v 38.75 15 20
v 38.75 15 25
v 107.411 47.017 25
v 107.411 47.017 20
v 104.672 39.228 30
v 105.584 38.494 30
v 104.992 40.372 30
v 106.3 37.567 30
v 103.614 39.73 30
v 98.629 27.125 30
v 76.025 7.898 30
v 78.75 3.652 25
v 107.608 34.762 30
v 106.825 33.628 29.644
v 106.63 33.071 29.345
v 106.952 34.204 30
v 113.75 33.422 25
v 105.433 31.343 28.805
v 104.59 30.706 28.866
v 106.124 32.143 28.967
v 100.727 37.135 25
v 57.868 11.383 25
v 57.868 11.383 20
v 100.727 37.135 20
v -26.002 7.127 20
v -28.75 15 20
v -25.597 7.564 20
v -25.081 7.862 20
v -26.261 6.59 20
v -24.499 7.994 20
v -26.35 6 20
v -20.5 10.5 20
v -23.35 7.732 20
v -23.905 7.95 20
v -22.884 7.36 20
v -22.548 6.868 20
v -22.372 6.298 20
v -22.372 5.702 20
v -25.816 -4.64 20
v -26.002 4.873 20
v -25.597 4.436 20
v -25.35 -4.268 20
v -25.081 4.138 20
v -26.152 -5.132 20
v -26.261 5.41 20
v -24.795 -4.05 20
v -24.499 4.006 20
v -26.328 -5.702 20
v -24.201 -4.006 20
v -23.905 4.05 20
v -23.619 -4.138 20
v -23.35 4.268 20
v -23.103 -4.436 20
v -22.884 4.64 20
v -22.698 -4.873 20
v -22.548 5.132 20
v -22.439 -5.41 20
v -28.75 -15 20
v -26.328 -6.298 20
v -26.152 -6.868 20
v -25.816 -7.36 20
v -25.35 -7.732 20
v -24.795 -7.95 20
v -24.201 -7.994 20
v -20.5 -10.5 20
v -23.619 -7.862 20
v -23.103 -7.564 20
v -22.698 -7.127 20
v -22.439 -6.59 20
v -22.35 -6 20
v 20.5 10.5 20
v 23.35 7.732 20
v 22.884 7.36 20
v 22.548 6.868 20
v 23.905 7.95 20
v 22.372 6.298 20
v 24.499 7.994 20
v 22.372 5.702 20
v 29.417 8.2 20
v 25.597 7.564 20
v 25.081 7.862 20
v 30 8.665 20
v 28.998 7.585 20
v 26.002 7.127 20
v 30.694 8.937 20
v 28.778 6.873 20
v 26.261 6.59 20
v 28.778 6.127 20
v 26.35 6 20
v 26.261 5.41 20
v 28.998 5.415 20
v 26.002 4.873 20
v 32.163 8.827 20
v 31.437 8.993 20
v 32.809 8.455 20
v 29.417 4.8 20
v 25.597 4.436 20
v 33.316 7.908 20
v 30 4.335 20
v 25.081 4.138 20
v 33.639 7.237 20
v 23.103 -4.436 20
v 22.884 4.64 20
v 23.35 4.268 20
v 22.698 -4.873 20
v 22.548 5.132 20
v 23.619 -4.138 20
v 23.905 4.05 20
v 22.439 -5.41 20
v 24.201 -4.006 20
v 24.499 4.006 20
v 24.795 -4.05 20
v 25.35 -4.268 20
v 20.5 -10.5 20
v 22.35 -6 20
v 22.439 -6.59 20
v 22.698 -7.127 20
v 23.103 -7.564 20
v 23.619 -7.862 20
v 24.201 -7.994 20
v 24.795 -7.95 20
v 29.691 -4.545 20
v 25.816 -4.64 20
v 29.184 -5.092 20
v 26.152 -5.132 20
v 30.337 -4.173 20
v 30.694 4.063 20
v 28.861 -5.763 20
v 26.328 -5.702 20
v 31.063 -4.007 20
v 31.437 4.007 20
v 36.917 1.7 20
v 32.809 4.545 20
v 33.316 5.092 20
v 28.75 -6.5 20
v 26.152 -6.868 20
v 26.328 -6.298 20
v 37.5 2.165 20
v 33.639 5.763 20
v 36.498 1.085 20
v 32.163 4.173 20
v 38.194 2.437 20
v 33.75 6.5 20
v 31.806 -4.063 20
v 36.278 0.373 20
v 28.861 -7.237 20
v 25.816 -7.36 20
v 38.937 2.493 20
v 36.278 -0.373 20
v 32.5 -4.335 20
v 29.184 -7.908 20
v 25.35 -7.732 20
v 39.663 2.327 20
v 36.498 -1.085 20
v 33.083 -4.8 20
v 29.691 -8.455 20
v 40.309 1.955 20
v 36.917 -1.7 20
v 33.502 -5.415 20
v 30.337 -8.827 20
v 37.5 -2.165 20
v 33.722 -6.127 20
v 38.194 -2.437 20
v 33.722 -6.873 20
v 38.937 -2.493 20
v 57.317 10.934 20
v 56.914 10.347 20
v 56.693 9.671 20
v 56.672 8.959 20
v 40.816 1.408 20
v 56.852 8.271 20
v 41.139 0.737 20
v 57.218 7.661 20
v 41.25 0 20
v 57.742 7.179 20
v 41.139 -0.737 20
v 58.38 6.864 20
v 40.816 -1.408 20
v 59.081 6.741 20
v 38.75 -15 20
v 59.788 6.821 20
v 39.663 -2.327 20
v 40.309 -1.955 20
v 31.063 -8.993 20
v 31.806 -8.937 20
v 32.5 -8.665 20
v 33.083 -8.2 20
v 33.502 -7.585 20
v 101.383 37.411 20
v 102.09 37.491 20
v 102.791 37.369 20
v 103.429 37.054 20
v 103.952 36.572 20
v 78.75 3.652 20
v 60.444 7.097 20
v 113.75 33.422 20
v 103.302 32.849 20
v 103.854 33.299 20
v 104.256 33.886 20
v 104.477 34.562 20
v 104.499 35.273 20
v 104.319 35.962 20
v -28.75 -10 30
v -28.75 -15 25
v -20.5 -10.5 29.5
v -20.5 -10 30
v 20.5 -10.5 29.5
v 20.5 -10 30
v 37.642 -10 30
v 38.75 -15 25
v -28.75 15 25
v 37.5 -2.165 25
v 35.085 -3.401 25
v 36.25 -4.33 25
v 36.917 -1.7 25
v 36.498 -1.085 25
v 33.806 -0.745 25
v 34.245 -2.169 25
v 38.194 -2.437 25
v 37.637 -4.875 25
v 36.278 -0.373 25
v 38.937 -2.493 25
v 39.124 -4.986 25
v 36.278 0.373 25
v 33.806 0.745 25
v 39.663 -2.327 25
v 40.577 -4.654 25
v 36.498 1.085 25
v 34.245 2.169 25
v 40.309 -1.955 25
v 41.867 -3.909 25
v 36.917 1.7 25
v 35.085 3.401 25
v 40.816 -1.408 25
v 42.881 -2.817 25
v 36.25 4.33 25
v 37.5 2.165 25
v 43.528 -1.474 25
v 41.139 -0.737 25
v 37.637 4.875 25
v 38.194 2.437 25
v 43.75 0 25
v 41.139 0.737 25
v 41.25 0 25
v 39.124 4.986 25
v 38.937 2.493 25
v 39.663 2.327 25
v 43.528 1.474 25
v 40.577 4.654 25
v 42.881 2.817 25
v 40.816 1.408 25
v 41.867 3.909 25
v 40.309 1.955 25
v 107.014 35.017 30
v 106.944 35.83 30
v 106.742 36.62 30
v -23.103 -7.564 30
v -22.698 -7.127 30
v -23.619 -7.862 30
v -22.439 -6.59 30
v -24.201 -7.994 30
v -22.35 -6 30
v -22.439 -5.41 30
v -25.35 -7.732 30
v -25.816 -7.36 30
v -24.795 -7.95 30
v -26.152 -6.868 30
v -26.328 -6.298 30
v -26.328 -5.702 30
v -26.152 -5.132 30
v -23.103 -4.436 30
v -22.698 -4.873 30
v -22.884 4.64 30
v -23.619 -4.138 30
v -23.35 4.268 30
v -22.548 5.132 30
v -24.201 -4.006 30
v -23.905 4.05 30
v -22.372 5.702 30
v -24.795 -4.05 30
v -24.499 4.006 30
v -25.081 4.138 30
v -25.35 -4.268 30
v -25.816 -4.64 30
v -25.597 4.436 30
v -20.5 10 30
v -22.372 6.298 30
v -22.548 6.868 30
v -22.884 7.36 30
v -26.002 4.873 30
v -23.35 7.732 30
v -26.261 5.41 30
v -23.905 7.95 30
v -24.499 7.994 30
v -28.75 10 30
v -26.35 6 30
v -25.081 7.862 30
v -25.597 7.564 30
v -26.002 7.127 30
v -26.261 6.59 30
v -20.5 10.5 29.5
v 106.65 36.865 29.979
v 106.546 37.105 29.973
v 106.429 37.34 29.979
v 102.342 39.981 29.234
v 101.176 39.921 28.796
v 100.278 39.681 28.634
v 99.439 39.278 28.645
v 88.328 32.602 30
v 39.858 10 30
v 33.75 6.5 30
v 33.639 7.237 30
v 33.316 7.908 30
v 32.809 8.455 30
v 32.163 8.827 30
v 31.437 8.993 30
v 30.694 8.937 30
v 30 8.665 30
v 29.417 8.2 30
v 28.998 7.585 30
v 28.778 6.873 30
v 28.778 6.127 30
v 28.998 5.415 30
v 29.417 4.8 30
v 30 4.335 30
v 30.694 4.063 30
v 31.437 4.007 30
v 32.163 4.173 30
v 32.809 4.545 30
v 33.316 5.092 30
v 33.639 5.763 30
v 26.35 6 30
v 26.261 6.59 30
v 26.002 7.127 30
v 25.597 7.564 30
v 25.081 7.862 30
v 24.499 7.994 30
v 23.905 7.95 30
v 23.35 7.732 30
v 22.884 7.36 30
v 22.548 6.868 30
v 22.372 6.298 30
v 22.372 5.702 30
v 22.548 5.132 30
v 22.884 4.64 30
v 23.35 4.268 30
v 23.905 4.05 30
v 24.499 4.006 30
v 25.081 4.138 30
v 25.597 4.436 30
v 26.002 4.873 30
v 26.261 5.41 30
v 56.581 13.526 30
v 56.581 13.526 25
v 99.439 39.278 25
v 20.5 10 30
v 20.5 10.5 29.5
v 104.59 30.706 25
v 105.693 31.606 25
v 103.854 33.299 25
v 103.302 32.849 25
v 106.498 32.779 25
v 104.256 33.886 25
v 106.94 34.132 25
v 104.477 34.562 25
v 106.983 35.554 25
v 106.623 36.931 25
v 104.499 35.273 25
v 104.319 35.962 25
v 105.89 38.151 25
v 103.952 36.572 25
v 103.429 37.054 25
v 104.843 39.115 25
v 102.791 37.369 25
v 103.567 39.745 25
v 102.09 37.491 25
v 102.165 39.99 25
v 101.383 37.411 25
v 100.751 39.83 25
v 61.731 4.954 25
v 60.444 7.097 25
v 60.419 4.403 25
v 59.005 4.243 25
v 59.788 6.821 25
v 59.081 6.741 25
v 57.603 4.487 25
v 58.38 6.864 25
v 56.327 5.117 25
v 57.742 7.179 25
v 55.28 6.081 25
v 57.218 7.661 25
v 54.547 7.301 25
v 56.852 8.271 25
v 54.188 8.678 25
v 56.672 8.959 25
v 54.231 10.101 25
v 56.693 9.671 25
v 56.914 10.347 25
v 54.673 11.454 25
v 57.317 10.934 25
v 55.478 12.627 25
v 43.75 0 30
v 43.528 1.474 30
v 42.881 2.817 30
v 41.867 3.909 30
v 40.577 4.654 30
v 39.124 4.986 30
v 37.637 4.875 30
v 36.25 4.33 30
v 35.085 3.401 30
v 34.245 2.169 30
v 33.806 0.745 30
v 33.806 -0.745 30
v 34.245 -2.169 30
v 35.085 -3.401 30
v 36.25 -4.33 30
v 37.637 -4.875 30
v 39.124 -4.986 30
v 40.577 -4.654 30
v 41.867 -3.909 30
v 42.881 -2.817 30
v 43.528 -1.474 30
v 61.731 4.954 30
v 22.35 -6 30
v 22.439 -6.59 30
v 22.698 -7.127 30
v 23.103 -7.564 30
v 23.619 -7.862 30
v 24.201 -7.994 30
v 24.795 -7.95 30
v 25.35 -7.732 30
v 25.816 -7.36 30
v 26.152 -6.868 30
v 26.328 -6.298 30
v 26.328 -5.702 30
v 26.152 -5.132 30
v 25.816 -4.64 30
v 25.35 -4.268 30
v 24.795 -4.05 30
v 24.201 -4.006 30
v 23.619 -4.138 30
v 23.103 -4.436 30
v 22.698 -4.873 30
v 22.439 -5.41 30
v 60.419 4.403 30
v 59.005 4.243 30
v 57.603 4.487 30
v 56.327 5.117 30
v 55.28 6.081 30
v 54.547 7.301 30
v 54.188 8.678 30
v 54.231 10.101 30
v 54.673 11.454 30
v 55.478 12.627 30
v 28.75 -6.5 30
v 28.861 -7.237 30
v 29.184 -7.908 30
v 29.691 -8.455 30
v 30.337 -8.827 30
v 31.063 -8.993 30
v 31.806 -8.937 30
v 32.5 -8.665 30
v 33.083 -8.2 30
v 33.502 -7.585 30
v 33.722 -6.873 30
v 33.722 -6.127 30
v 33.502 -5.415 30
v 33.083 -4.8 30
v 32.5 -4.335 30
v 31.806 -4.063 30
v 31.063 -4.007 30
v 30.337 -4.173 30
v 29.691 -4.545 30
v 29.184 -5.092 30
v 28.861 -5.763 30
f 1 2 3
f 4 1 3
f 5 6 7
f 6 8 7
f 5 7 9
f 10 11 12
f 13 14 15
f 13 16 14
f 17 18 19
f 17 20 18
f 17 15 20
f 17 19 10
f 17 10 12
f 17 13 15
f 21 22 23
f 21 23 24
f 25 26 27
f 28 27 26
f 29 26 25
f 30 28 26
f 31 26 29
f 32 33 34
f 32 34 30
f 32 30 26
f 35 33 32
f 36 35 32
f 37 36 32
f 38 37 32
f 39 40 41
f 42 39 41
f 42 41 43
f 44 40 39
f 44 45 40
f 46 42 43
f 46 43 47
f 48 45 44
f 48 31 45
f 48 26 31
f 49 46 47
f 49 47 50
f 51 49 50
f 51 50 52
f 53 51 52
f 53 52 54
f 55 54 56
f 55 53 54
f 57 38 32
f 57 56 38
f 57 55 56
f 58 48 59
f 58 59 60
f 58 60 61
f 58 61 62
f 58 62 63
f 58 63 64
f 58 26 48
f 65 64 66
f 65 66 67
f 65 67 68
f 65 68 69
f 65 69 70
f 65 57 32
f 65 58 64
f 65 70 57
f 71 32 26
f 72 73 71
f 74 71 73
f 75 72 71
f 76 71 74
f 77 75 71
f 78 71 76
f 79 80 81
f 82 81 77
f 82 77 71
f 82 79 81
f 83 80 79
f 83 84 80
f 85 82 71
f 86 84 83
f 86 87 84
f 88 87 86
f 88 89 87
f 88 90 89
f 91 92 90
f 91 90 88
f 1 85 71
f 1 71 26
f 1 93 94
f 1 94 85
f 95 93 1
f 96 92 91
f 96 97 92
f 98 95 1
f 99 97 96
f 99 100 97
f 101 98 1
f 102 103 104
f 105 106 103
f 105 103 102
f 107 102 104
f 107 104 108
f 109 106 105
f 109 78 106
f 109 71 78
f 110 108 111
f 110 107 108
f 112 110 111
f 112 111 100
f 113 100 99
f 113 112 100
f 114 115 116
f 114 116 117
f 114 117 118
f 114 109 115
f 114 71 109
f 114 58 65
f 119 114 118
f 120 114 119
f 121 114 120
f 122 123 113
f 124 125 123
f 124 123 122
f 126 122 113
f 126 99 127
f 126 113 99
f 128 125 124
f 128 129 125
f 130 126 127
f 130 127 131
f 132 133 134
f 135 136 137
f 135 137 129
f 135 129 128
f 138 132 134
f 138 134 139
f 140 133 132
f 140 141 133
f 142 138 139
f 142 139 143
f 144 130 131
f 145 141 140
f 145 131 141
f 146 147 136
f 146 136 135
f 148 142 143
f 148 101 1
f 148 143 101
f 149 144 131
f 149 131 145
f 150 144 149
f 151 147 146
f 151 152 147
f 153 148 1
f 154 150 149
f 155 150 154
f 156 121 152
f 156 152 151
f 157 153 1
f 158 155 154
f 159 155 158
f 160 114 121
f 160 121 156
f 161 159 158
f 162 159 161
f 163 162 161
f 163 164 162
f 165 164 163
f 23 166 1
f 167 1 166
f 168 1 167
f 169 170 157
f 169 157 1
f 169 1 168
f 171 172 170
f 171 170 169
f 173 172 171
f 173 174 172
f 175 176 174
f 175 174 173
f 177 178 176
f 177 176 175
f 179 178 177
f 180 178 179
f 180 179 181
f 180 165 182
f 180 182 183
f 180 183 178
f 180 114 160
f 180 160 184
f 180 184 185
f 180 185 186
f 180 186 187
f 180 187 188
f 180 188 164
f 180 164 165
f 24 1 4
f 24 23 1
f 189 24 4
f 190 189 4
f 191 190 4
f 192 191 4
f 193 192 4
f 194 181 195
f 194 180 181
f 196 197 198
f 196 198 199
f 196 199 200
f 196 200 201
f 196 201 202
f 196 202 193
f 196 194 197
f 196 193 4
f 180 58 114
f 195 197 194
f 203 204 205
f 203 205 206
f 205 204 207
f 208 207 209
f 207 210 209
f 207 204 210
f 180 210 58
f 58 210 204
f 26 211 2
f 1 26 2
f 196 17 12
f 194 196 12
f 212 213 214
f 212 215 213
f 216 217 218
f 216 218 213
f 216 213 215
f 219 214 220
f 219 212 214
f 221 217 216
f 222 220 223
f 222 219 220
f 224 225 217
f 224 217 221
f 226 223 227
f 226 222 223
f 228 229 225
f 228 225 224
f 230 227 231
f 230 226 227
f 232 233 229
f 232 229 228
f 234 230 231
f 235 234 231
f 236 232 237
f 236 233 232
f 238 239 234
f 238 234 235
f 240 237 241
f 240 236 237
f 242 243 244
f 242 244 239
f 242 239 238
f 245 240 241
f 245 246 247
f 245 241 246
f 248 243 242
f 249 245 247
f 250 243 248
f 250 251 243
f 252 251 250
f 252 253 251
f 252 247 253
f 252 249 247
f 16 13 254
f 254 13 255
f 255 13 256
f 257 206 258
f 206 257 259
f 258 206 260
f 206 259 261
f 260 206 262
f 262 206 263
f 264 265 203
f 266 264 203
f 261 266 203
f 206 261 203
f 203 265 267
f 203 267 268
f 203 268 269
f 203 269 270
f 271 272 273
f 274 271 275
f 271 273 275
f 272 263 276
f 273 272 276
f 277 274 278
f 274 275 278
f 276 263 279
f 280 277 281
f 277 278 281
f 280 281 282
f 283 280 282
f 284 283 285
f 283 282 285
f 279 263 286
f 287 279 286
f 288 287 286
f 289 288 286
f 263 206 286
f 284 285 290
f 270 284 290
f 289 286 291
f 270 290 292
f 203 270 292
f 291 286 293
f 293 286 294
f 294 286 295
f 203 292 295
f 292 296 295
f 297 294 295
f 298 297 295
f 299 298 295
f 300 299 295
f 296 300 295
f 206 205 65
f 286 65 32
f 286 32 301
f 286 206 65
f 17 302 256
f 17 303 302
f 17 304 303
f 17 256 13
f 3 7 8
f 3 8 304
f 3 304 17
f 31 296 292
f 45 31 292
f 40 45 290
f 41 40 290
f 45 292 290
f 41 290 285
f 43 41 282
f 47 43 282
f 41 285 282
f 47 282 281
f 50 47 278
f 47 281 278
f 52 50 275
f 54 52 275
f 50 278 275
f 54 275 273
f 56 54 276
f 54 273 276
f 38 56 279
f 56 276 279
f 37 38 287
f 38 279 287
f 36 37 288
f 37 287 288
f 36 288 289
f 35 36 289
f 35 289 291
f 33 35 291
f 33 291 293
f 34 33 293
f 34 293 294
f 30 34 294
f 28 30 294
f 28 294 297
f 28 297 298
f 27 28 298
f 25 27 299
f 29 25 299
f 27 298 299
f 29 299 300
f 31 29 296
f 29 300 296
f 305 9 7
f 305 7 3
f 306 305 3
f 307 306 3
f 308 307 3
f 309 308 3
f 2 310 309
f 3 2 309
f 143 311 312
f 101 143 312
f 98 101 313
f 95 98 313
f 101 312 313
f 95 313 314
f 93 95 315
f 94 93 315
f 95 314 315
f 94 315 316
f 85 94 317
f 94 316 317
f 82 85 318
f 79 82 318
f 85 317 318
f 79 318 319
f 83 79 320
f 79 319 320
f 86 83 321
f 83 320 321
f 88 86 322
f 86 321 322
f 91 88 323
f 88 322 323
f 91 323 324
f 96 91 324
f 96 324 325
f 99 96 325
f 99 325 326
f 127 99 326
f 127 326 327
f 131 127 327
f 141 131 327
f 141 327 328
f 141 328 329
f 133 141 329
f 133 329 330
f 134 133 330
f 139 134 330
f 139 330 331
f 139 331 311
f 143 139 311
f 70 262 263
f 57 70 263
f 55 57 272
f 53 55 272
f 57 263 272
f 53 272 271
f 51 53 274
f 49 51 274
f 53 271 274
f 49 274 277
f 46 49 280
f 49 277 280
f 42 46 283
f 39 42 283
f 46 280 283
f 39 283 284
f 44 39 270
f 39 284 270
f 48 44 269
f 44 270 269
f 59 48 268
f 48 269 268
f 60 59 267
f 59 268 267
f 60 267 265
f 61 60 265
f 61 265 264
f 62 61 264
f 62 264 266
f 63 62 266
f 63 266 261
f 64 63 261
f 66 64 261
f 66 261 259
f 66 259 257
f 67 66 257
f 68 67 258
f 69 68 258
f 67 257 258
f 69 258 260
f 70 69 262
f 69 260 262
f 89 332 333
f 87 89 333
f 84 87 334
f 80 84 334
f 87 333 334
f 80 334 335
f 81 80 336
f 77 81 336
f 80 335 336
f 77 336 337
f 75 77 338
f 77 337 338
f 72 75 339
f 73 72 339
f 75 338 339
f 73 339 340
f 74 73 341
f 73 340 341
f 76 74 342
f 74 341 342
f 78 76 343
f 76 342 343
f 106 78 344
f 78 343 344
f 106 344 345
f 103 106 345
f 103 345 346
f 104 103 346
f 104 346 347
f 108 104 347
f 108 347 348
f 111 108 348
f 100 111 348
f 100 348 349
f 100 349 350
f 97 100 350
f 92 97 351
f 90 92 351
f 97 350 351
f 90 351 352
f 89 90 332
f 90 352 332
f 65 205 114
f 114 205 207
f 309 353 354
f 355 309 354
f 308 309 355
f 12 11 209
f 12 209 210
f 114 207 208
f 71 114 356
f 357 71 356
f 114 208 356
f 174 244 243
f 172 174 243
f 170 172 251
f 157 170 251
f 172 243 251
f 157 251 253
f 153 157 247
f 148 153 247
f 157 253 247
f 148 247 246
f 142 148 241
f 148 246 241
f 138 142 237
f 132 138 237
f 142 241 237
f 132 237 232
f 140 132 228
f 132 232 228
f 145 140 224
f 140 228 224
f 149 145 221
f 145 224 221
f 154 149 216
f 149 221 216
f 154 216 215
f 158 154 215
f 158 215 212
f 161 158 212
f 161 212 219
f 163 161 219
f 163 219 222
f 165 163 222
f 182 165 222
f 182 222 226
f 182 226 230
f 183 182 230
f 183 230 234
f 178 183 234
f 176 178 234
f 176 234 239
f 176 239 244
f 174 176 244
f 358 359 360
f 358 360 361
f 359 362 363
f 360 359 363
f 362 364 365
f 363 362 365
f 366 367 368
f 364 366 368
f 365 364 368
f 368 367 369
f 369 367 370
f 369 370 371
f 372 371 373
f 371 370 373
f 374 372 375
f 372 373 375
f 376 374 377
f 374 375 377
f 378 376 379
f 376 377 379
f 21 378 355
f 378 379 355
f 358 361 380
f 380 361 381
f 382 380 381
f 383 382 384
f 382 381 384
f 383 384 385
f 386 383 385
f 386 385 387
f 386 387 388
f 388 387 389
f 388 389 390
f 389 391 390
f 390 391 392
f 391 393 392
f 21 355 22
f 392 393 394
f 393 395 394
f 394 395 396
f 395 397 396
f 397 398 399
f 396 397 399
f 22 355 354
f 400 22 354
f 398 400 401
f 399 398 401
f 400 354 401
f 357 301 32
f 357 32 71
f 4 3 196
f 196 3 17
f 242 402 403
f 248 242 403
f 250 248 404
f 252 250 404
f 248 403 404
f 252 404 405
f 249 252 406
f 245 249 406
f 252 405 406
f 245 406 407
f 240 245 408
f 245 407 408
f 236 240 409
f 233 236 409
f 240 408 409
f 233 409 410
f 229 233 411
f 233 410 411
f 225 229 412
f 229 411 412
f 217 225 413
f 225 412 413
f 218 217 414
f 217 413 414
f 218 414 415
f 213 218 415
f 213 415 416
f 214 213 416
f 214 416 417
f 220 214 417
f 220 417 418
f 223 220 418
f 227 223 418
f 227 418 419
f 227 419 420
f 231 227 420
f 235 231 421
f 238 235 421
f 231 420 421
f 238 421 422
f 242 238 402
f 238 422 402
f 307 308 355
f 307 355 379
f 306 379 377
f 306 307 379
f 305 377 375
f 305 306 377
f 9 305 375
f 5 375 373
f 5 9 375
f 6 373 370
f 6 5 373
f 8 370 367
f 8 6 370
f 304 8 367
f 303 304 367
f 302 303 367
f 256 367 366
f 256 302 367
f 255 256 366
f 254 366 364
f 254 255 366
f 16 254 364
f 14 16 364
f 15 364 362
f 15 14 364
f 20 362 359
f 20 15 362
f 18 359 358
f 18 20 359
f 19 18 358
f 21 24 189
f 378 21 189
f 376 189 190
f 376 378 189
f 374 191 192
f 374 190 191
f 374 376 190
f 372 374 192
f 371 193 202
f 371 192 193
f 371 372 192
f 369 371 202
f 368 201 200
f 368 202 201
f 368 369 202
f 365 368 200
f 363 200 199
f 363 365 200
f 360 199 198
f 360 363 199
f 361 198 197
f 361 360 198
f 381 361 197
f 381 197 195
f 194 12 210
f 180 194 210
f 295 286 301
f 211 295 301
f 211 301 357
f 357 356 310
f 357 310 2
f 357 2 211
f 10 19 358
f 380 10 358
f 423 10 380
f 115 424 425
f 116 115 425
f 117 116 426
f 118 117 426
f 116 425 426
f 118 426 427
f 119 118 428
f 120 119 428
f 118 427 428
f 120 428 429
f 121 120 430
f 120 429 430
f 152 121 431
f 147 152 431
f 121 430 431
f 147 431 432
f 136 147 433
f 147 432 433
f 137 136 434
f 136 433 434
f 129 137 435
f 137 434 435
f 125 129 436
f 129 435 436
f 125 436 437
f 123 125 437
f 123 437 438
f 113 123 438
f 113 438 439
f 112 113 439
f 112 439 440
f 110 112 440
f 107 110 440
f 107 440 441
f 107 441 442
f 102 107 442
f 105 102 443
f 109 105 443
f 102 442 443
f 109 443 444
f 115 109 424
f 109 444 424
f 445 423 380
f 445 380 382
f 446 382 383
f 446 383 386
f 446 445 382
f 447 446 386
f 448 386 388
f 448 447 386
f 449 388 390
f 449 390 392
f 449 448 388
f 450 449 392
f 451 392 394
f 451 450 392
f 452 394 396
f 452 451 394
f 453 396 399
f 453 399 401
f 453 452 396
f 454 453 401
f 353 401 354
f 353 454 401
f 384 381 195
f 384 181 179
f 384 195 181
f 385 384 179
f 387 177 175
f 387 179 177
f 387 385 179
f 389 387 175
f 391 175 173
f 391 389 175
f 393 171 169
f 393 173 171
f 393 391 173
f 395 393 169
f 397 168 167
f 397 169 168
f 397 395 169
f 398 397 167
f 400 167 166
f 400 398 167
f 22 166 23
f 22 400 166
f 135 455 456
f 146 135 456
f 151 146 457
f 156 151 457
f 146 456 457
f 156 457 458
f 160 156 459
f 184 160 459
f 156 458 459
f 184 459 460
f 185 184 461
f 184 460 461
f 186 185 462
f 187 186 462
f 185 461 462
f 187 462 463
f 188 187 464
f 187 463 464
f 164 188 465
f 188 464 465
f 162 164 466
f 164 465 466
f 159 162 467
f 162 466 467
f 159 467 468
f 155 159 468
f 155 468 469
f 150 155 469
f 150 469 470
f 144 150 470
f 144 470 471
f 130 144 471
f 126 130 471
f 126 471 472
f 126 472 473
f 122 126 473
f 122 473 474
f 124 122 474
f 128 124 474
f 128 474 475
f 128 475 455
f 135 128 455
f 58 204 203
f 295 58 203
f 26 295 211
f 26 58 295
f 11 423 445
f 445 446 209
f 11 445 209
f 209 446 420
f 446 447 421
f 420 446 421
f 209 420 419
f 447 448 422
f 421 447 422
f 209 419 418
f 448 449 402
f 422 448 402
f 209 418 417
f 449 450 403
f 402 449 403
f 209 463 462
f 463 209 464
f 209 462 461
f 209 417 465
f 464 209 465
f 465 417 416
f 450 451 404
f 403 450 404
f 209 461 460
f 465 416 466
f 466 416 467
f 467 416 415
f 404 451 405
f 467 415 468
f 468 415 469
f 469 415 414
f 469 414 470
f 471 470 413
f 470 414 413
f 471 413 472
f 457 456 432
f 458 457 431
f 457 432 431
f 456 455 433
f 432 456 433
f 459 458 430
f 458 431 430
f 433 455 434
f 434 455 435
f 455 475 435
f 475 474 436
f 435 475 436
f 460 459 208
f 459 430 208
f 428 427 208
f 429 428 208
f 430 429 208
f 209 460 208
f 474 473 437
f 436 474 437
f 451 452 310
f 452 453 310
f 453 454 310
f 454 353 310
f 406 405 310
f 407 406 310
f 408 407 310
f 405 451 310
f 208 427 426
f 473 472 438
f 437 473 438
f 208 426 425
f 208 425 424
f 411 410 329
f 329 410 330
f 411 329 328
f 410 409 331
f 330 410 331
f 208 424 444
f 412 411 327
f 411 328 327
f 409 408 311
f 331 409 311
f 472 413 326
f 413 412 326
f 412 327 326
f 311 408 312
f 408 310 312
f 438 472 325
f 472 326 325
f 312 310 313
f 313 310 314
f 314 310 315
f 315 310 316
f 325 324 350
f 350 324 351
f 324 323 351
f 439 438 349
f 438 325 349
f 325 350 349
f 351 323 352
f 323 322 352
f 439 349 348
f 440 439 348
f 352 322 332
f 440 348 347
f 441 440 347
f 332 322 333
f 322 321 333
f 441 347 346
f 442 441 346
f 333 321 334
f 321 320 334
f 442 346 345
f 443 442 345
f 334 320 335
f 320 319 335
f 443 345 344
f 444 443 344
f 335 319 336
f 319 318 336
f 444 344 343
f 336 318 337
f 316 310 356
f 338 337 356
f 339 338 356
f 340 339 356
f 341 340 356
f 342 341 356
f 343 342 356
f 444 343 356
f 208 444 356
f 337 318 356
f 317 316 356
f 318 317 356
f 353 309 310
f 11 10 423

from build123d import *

# Parameters (mm, degrees)
SKETCH1_W                = 57.5
SKETCH1_H                = 30
BOSS_EXTRUDE1_DEPTH      = 30
SKETCH2_W                = 41
SKETCH2_H                = 21
CUT_EXTRUDE1_DEPTH       = 25
SKETCH8_R                = 2
CUT_EXTRUDE6_DEPTH       = 10
SKETCH10_R               = 5
CUT_EXTRUDE8_DEPTH       = 10
BOSS_EXTRUDE4_DEPTH      = 30
SKETCH16_R               = 5
CUT_EXTRUDE10_DEPTH      = 30
CHAMFER5_SIZE            = 5
SKETCH19_R               = 2.5
CUT_EXTRUDE12_DEPTH      = 30
SKETCH20_R               = 7.5
CUT_EXTRUDE13_DEPTH      = 2.5
CUT_EXTRUDE15_DEPTH      = 122.918629513
CUT_EXTRUDE15_DEPTH_BACK = 122.918629513
SKETCH29_W               = 67.5
SKETCH29_H               = 15
CUT_EXTRUDE16_DEPTH      = 124.489525441
CUT_EXTRUDE17_DEPTH      = 5
SKETCH32_R               = 5
CUT_EXTRUDE18_DEPTH      = 5


with BuildPart() as part:
    # Sketch1 → Boss-Extrude1 (new body)
    with BuildSketch(Plane.XY):
        Rectangle(SKETCH1_W, SKETCH1_H)
    extrude(amount=BOSS_EXTRUDE1_DEPTH)

    # Sketch2 → Cut-Extrude1 (cut)
    with BuildSketch(Plane.XY.offset(30)):
        Rectangle(SKETCH2_W, SKETCH2_H)
    extrude(amount=-CUT_EXTRUDE1_DEPTH, mode=Mode.SUBTRACT)

    # Sketch8 → Cut-Extrude6 (cut)
    with BuildSketch(Plane.XY.offset(30)):
        with Locations((24.35, 6)):
            Circle(SKETCH8_R)
        with Locations(Location((24.35, -6, 0), (0, 0, 180))):
            Circle(SKETCH8_R)
        with Locations((-24.35, -6)):
            Circle(SKETCH8_R)
        with Locations(Location((-24.35, 6, 0), (0, 0, 180))):
            Circle(SKETCH8_R)
    extrude(amount=-CUT_EXTRUDE6_DEPTH, mode=Mode.SUBTRACT)

    # Sketch10 → Cut-Extrude8 (cut)
    with BuildSketch(Plane.XY.offset(5)):
        with Locations((-10, 0)):
            Circle(SKETCH10_R)
    extrude(amount=-CUT_EXTRUDE8_DEPTH, mode=Mode.SUBTRACT)

    # Sketch13 → Boss-Extrude4 (add)
    with BuildSketch(Plane.XY.offset(30)):
        Polygon((28.75, 15), (38.75, 15), (107.410726074, 47.017022383), (113.75, 33.422405577), (78.75, 3.652306326), (38.75, -15), (28.75, -15), align=None)
    extrude(amount=-BOSS_EXTRUDE4_DEPTH)

    # Sketch16 → Cut-Extrude10 (cut)
    with BuildSketch(Plane(origin=(1.175656739, -2.521204013, 0), x_dir=(0.9063077870366488, 0.42261826174070183, 0), z_dir=(-0.42261826174070183, 0.9063077870366488, 0))):
        with Locations(Location((97.217429724, -15, 0), (0, 0, 180))):
            Circle(SKETCH16_R)
        with BuildLine():
            Line((67.217429724, -12.5), (82.217429724, -12.5))
            ThreePointArc((82.217429724, -12.5), (84.717429724, -15), (82.217429724, -17.5))
            Line((82.217429724, -17.5), (67.217429724, -17.5))
            ThreePointArc((67.217429724, -17.5), (64.717429724, -15), (67.217429724, -12.5))
        make_face()
    extrude(amount=-CUT_EXTRUDE10_DEPTH, mode=Mode.SUBTRACT)

    # Chamfer5
    # the kernel refuses this chamfer: 5 mm, written as the material it takes off along each edge
    with BuildSketch(Plane(origin=(-28.75, 27.85841494, 0), x_dir=(-0.027495876610586317, 0, 0.9996219169112968), z_dir=(0, -1, 0))) as chamfer5_piece_1:
        Polygon((CHAMFER5_SIZE * 0.999621916911, -CHAMFER5_SIZE * 0.0274958766106), (-CHAMFER5_SIZE * 0.0274958766106, -CHAMFER5_SIZE * 0.999621916911), (0, 0), align=None)
    extrude(amount=55.71682988, mode=Mode.SUBTRACT)
    with BuildSketch(Plane(origin=(-41.60841494, -15, 0), x_dir=(0, -0.027495876610586317, 0.9996219169112968), z_dir=(1, 0, 0)), Plane(origin=(51.60841494, -15, 30), x_dir=(0, -0.027495876610586317, -0.9996219169112968), z_dir=(-1, 0, 0))) as chamfer5_piece_2:
        Polygon((CHAMFER5_SIZE * 0.999621916911, -CHAMFER5_SIZE * 0.0274958766106), (-CHAMFER5_SIZE * 0.0274958766106, -CHAMFER5_SIZE * 0.999621916911), (0, 0), align=None)
    extrude(amount=93.21682988, mode=Mode.SUBTRACT)
    with BuildSketch(Plane(origin=(90.403681589, 9.086507297, 0), x_dir=(0.011620259578202724, -0.024919727083573626, 0.9996219169112968), z_dir=(-0.9063077870366526, -0.4226182617406939, 0)), Plane(origin=(90.403681589, 9.086507297, 30), x_dir=(-0.4224584769229526, 0.905965127389214, 0.02749587661058631), z_dir=(-0.9063077870366526, -0.4226182617406939, 0))) as chamfer5_piece_3:
        Polygon((CHAMFER5_SIZE * 0.999621916911, CHAMFER5_SIZE * 0.0274958766106), (-CHAMFER5_SIZE * 0.0274958766106, CHAMFER5_SIZE * 0.999621916911), (0, 0), align=None)
    extrude(amount=69.851946638, mode=Mode.SUBTRACT)
    with BuildSketch(Plane(origin=(123.544555766, 41.753402643, 0), x_dir=(-0.6476573741944397, 0.7614354223576539, -0.027495876610586414), z_dir=(-0.7617234170999287, -0.6479023351104763, 0))) as chamfer5_piece_4:
        Polygon((CHAMFER5_SIZE * 0.999621916911, -CHAMFER5_SIZE * 0.0274958766106), (-CHAMFER5_SIZE * 0.0274958766106, -CHAMFER5_SIZE * 0.999621916911), (0, 0), align=None)
    extrude(amount=71.665266299, mode=Mode.SUBTRACT)
    with BuildSketch(Plane(origin=(101.976525103, 58.670703972, 0), x_dir=(-0.9059651273892108, -0.42245847692295924, -0.027495876610586344), z_dir=(0.42261826174070055, -0.9063077870366495, 0))) as chamfer5_piece_5:
        Polygon((CHAMFER5_SIZE * 0.999621916911, -CHAMFER5_SIZE * 0.0274958766106), (-CHAMFER5_SIZE * 0.0274958766106, -CHAMFER5_SIZE * 0.999621916911), (0, 0), align=None)
    extrude(amount=40.71682988, mode=Mode.SUBTRACT)
    with BuildSketch(Plane(origin=(27.096318411, 9.565799029, 0), x_dir=(0.4224584769229604, -0.9059651273892103, -0.02749587661058636), z_dir=(0.9063077870366489, 0.4226182617407018, 0))) as chamfer5_piece_6_section:
        Polygon((CHAMFER5_SIZE * 0.999621916911, -CHAMFER5_SIZE * 0.0274958766106), (-CHAMFER5_SIZE * 0.0274958766106, -CHAMFER5_SIZE * 0.999621916911), (0, 0), align=None)
    chamfer5_piece_6 = extrude(amount=101.47555893, mode=Mode.PRIVATE)
    chamfer5_piece_6 = split(chamfer5_piece_6, bisect_by=Plane(origin=(81.150743587, 15, 1.670360501), z_dir=(0, 1, 0)), keep=Keep.TOP, mode=Mode.PRIVATE)
    add(chamfer5_piece_6, mode=Mode.SUBTRACT)
    with BuildSketch(Plane(origin=(-41.60841494, 15, 0), x_dir=(0, -0.9996219169112968, -0.027495876610586372), z_dir=(1, 0, 0))) as chamfer5_piece_7_section:
        Polygon((CHAMFER5_SIZE * 0.999621916911, -CHAMFER5_SIZE * 0.0274958766106), (-CHAMFER5_SIZE * 0.0274958766106, -CHAMFER5_SIZE * 0.999621916911), (0, 0), align=None)
    chamfer5_piece_7 = extrude(amount=93.21682988, mode=Mode.PRIVATE)
    chamfer5_piece_7 = split(chamfer5_piece_7, bisect_by=Plane(origin=(3.719146846, -1.335155097, 1.672660276), z_dir=(-0.4226182617407018, 0.9063077870366489, 0)), keep=Keep.TOP, mode=Mode.PRIVATE)
    add(chamfer5_piece_7, mode=Mode.SUBTRACT)
    with BuildSketch(Plane(origin=(51.60841494, 15, 30), x_dir=(0, -0.9996219169112968, 0.027495876610586317), z_dir=(-1, 0, 0))) as chamfer5_piece_8_section:
        Polygon((CHAMFER5_SIZE * 0.999621916911, -CHAMFER5_SIZE * 0.0274958766106), (-CHAMFER5_SIZE * 0.0274958766106, -CHAMFER5_SIZE * 0.999621916911), (0, 0), align=None)
    chamfer5_piece_8 = extrude(amount=93.21682988, mode=Mode.PRIVATE)
    chamfer5_piece_8 = split(chamfer5_piece_8, bisect_by=Plane(origin=(3.719146846, -1.335155097, 28.327339724), z_dir=(-0.4226182617407018, 0.9063077870366489, 0)), keep=Keep.TOP, mode=Mode.PRIVATE)
    add(chamfer5_piece_8, mode=Mode.SUBTRACT)
    with BuildSketch(Plane(origin=(123.544555766, 41.753402643, 30), x_dir=(-0.6476573741944397, 0.7614354223576539, 0.02749587661058634), z_dir=(-0.7617234170999287, -0.6479023351104763, 0))) as chamfer5_piece_9:
        Polygon((CHAMFER5_SIZE * 0.999621916911, CHAMFER5_SIZE * 0.0274958766106), (-CHAMFER5_SIZE * 0.0274958766106, CHAMFER5_SIZE * 0.999621916911), (0, 0), align=None)
    extrude(amount=71.665266299, mode=Mode.SUBTRACT)
    with BuildSketch(Plane(origin=(27.096318411, 9.565799029, 30), x_dir=(0.4224584769229604, -0.9059651273892103, 0.027495876610586313), z_dir=(0.9063077870366489, 0.4226182617407018, 0))) as chamfer5_piece_10_section:
        Polygon((CHAMFER5_SIZE * 0.999621916911, CHAMFER5_SIZE * 0.0274958766106), (-CHAMFER5_SIZE * 0.0274958766106, CHAMFER5_SIZE * 0.999621916911), (0, 0), align=None)
    chamfer5_piece_10 = extrude(amount=101.47555893, mode=Mode.PRIVATE)
    chamfer5_piece_10 = split(chamfer5_piece_10, bisect_by=Plane(origin=(81.150743587, 15, 28.329639499), z_dir=(0, 1, 0)), keep=Keep.TOP, mode=Mode.PRIVATE)
    add(chamfer5_piece_10, mode=Mode.SUBTRACT)
    with BuildSketch(Plane(origin=(101.976525103, 58.670703972, 30), x_dir=(-0.9059651273892108, -0.42245847692295924, 0.027495876610586337), z_dir=(0.42261826174070055, -0.9063077870366495, 0))) as chamfer5_piece_11:
        Polygon((CHAMFER5_SIZE * 0.999621916911, CHAMFER5_SIZE * 0.0274958766106), (-CHAMFER5_SIZE * 0.0274958766106, CHAMFER5_SIZE * 0.999621916911), (0, 0), align=None)
    extrude(amount=40.71682988, mode=Mode.SUBTRACT)
    with BuildSketch(Plane(origin=(27.096318411, 9.565799029, 0), x_dir=(0.4224584769229604, -0.9059651273892103, -0.02749587661058636), z_dir=(0.9063077870366489, 0.4226182617407018, 0))) as chamfer5_piece_12a_section:
        Polygon((CHAMFER5_SIZE * 0.999621916911, -CHAMFER5_SIZE * 0.0274958766106), (-CHAMFER5_SIZE * 0.0274958766106, -CHAMFER5_SIZE * 0.999621916911), (0, 0), align=None)
    chamfer5_piece_12a = extrude(amount=101.47555893, mode=Mode.PRIVATE)
    chamfer5_piece_12a = split(chamfer5_piece_12a, bisect_by=Plane(origin=(35.512062488, 15, 1.537951212), z_dir=(0, -1, 0)), keep=Keep.TOP, mode=Mode.PRIVATE)
    with BuildSketch(Plane(origin=(-41.60841494, 15, 0), x_dir=(0, -0.9996219169112968, -0.027495876610586372), z_dir=(1, 0, 0))) as chamfer5_piece_12b_section:
        Polygon((CHAMFER5_SIZE * 0.999621916911, -CHAMFER5_SIZE * 0.0274958766106), (-CHAMFER5_SIZE * 0.0274958766106, -CHAMFER5_SIZE * 0.999621916911), (0, 0), align=None)
    chamfer5_piece_12b = extrude(amount=93.21682988, mode=Mode.PRIVATE)
    chamfer5_piece_12b = split(chamfer5_piece_12b, bisect_by=Plane(origin=(41.684567981, 16.368411523, 1.537951212), z_dir=(0.4226182617407018, -0.9063077870366489, 0)), keep=Keep.TOP, mode=Mode.PRIVATE)
    chamfer5_piece_12 = chamfer5_piece_12a & chamfer5_piece_12b
    add(chamfer5_piece_12, mode=Mode.SUBTRACT)
    with BuildSketch(Plane(origin=(27.096318411, 9.565799029, 30), x_dir=(0.4224584769229604, -0.9059651273892103, 0.027495876610586313), z_dir=(0.9063077870366489, 0.4226182617407018, 0))) as chamfer5_piece_13a_section:
        Polygon((CHAMFER5_SIZE * 0.999621916911, CHAMFER5_SIZE * 0.0274958766106), (-CHAMFER5_SIZE * 0.0274958766106, CHAMFER5_SIZE * 0.999621916911), (0, 0), align=None)
    chamfer5_piece_13a = extrude(amount=101.47555893, mode=Mode.PRIVATE)
    chamfer5_piece_13a = split(chamfer5_piece_13a, bisect_by=Plane(origin=(35.512062488, 15, 28.462048788), z_dir=(0, -1, 0)), keep=Keep.TOP, mode=Mode.PRIVATE)
    with BuildSketch(Plane(origin=(51.60841494, 15, 30), x_dir=(0, -0.9996219169112968, 0.027495876610586317), z_dir=(-1, 0, 0))) as chamfer5_piece_13b_section:
        Polygon((CHAMFER5_SIZE * 0.999621916911, -CHAMFER5_SIZE * 0.0274958766106), (-CHAMFER5_SIZE * 0.0274958766106, -CHAMFER5_SIZE * 0.999621916911), (0, 0), align=None)
    chamfer5_piece_13b = extrude(amount=93.21682988, mode=Mode.PRIVATE)
    chamfer5_piece_13b = split(chamfer5_piece_13b, bisect_by=Plane(origin=(41.684567981, 16.368411523, 28.462048788), z_dir=(0.4226182617407018, -0.9063077870366489, 0)), keep=Keep.TOP, mode=Mode.PRIVATE)
    chamfer5_piece_13 = chamfer5_piece_13a & chamfer5_piece_13b
    add(chamfer5_piece_13, mode=Mode.SUBTRACT)

    # Sketch19 → Cut-Extrude12 (cut)
    with BuildSketch(Plane.XY.offset(30)):
        with Locations((38.75, 0)):
            Circle(SKETCH19_R)
        with Locations((31.25, 6.5)):
            Circle(SKETCH19_R)
        with Locations(Location((31.25, -6.5, 0), (0, 0, 180))):
            Circle(SKETCH19_R)
    extrude(amount=-CUT_EXTRUDE12_DEPTH, mode=Mode.SUBTRACT)

    # Sketch20 → Cut-Extrude13 (cut)
    with BuildSketch(Plane.XY.offset(5)):
        with Locations((-10, 0)):
            Circle(SKETCH20_R)
    extrude(amount=-CUT_EXTRUDE13_DEPTH, mode=Mode.SUBTRACT)

    # Sketch29 → Cut-Extrude15 (cut, two sides: drawn at the far end of the back side and taken through both)
    with BuildSketch(Plane(origin=(0, 15, 0), x_dir=(1, 0, 0), z_dir=(0, 1, 0)).offset(-CUT_EXTRUDE15_DEPTH_BACK)):
        with Locations((5, -12.5)):
            Rectangle(SKETCH29_W, SKETCH29_H)
        Polygon((38.75, -20), (113.75, -20), (113.75, 0), (-28.75, 0), (-28.75, -5), (38.75, -5), align=None)
    extrude(amount=CUT_EXTRUDE15_DEPTH + CUT_EXTRUDE15_DEPTH_BACK, mode=Mode.SUBTRACT)

    # Sketch30 → Cut-Extrude16 (cut, through all)
    with BuildSketch(Plane.XY.offset(30)):
        with BuildLine():
            Line((57.868462424, 11.383242603), (100.726827459, 37.135146348))
            ThreePointArc((100.726827459, 37.135146348), (104.157340898, 36.279823284), (103.302017833, 32.849309845))
            Line((103.302017833, 32.849309845), (60.443652798, 7.097406099))
            ThreePointArc((60.443652798, 7.097406099), (57.013139359, 7.952729164), (57.868462424, 11.383242603))
        make_face()
    extrude(amount=-CUT_EXTRUDE16_DEPTH, mode=Mode.SUBTRACT)

    # Sketch31 → Cut-Extrude17 (cut)
    with BuildSketch(Plane.XY.offset(30)):
        with BuildLine():
            Line((104.589613021, 30.706391593), (61.731247986, 4.954487847))
            ThreePointArc((61.731247986, 4.954487847), (54.870221108, 6.665133976), (56.580867236, 13.526160855))
            Line((56.580867236, 13.526160855), (99.439232272, 39.2780646))
            ThreePointArc((99.439232272, 39.2780646), (106.30025915, 37.567418471), (104.589613021, 30.706391593))
        make_face()
    extrude(amount=-CUT_EXTRUDE17_DEPTH, mode=Mode.SUBTRACT)

    # Sketch32 → Cut-Extrude18 (cut)
    with BuildSketch(Plane.XY.offset(30)):
        with Locations((38.75, 0)):
            Circle(SKETCH32_R)
    extrude(amount=-CUT_EXTRUDE18_DEPTH, mode=Mode.SUBTRACT)


solid = part.part
